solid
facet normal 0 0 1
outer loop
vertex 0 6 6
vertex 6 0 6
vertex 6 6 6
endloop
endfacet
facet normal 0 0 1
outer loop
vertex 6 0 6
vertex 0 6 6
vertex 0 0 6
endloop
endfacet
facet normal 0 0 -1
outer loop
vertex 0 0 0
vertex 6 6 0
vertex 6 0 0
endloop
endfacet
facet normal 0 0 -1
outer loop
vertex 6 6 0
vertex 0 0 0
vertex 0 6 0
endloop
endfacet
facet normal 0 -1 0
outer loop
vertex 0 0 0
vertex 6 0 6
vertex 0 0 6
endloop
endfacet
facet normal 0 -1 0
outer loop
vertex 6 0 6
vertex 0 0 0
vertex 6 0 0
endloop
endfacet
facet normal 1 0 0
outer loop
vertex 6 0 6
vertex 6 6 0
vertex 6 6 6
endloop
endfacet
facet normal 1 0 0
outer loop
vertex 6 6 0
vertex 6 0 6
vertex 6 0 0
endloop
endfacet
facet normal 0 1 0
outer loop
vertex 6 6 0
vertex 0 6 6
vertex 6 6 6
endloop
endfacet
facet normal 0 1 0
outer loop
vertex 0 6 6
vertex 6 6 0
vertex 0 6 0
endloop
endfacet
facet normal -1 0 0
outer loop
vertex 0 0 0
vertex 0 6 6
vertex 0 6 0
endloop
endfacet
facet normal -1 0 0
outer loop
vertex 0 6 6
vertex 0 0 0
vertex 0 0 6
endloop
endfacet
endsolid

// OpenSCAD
echo("The quick brown fox \tjumps \"over\" the lazy dog.\rThe quick brown fox.\nThe \\lazy\\ dog.");

asd = 1;
2asd = 2;
asd2 = 3;


/* multiline
 comment    */

echo(asd + 2asd + asd2);
cube(asd + 2asd + asd2);
